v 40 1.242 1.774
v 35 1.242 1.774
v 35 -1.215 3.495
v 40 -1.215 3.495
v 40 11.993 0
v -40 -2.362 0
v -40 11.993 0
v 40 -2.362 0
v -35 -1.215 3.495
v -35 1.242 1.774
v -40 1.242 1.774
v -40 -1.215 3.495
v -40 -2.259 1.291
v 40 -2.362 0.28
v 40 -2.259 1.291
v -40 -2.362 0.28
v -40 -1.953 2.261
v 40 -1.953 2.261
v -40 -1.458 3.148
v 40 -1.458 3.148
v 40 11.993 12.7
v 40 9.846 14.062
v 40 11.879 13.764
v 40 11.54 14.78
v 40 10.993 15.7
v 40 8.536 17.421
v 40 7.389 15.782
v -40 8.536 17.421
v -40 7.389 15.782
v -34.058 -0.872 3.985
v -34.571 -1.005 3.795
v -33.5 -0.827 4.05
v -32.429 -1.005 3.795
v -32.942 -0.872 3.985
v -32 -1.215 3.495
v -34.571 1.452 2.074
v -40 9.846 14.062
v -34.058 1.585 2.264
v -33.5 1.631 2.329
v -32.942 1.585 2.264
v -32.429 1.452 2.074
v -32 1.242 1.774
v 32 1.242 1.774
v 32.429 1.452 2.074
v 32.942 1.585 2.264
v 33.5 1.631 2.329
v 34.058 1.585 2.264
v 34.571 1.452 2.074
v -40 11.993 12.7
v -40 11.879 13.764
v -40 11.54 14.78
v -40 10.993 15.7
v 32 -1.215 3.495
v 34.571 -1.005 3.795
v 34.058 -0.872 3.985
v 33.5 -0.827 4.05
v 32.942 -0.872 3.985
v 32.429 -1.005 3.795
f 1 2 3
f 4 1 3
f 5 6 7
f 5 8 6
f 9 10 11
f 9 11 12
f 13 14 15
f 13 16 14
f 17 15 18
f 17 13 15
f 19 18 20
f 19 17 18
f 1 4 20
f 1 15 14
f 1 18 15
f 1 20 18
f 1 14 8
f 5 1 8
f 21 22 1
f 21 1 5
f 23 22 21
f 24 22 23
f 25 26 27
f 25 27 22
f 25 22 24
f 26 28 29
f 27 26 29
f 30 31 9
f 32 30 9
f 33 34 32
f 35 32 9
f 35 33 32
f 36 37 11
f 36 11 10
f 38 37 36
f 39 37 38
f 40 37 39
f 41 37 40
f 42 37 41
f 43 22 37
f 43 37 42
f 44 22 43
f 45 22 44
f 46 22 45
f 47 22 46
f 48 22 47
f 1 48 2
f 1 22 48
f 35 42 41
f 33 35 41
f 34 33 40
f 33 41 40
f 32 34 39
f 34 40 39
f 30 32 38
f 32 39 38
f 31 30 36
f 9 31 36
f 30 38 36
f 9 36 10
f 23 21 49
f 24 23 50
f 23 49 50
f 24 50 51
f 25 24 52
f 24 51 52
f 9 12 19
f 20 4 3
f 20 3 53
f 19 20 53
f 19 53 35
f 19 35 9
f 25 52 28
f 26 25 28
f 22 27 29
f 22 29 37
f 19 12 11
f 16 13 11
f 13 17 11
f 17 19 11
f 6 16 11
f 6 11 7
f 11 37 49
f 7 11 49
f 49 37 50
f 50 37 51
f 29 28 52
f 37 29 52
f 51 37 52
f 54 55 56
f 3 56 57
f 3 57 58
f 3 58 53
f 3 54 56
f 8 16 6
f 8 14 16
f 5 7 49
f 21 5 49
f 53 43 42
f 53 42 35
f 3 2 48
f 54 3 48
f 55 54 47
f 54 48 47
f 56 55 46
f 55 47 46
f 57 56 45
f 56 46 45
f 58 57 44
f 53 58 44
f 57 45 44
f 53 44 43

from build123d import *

# Parameters (mm, degrees)
F1_DEPTH    = 40
F2_R        = 5
F3_T1_DEPTH = 95
F5_DEPTH    = 3


# Not quite as in the source:
# - a fillet or chamfer that OpenCascade refuses, or shapes differently, is made with other operations: its cross-section is extruded or revolved along the edge and cut away or added


with BuildPart() as f1:
    # F0 (on Right) → F1 (new body, symmetric)
    with BuildSketch(Plane.YZ):
        Polygon((0.0953060592, 0.1361111585), (0, 0), (11.9932583499, 0), (11.9932583499, 15.7), (10.9932583499, 15.7), (9.8461054772, 14.0616959114), (1.2424589319, 1.7744152471), align=None)
        Polygon((7.3886493443, 15.7824252205), (9.8461054772, 14.0616959114), (10.9932583499, 15.7), (8.535802217, 17.4207293091), align=None)
        Polygon((-2.3621500736, 1.8568404676), (0.0953060592, 0.1361111585), (1.2424589319, 1.7744152471), (-1.2149972009, 3.4951445561), align=None)
        Polygon((-2.3621500736, 0), (0, 0), (0.0953060592, 0.1361111585), (-2.3621500736, 1.8568404676), align=None)
    extrude(amount=F1_DEPTH, both=True)

    # F2
    f2_edges = [f1.edges().sort_by_distance(p)[0] for p in [
        (0, -2.36215, 1.85684),
    ]]
    fillet(f2_edges, radius=F2_R)

    # F3: fillet of radius 5 on 1 edges, made by hand

    # F3_s2 → F3_t1 (cut)
    with BuildSketch(Plane.YZ.offset(-47.5)):
        with BuildLine():
            ThreePointArc((11.9932583499, 12.7), (11.7366748401, 14.2811388301), (10.9932583499, 15.7))
            Line((10.9932583499, 15.7), (11.9932583499, 15.7))
            Line((11.9932583499, 15.7), (11.9932583499, 12.7))
        make_face()
    extrude(amount=F3_T1_DEPTH, mode=Mode.SUBTRACT)

    # F4 (on face) → F5 (join)
    with BuildSketch(Plane(origin=(0, 0, 0), x_dir=(1, 0, 0), z_dir=(0, -0.8191520443, 0.5735764364))):
        with BuildLine():
            Line((-35, 2.1661610436), (-32, 2.1661610436))
            ThreePointArc((-32, 2.1661610436), (-33.5, 2.843285388), (-35, 2.1661610436))
        make_face()
        with BuildLine():
            ThreePointArc((35, 2.1661610436), (33.5, 2.843285388), (32, 2.1661610436))
            Line((32, 2.1661610436), (35, 2.1661610436))
        make_face()
    extrude(amount=F5_DEPTH)


solid = f1.part
